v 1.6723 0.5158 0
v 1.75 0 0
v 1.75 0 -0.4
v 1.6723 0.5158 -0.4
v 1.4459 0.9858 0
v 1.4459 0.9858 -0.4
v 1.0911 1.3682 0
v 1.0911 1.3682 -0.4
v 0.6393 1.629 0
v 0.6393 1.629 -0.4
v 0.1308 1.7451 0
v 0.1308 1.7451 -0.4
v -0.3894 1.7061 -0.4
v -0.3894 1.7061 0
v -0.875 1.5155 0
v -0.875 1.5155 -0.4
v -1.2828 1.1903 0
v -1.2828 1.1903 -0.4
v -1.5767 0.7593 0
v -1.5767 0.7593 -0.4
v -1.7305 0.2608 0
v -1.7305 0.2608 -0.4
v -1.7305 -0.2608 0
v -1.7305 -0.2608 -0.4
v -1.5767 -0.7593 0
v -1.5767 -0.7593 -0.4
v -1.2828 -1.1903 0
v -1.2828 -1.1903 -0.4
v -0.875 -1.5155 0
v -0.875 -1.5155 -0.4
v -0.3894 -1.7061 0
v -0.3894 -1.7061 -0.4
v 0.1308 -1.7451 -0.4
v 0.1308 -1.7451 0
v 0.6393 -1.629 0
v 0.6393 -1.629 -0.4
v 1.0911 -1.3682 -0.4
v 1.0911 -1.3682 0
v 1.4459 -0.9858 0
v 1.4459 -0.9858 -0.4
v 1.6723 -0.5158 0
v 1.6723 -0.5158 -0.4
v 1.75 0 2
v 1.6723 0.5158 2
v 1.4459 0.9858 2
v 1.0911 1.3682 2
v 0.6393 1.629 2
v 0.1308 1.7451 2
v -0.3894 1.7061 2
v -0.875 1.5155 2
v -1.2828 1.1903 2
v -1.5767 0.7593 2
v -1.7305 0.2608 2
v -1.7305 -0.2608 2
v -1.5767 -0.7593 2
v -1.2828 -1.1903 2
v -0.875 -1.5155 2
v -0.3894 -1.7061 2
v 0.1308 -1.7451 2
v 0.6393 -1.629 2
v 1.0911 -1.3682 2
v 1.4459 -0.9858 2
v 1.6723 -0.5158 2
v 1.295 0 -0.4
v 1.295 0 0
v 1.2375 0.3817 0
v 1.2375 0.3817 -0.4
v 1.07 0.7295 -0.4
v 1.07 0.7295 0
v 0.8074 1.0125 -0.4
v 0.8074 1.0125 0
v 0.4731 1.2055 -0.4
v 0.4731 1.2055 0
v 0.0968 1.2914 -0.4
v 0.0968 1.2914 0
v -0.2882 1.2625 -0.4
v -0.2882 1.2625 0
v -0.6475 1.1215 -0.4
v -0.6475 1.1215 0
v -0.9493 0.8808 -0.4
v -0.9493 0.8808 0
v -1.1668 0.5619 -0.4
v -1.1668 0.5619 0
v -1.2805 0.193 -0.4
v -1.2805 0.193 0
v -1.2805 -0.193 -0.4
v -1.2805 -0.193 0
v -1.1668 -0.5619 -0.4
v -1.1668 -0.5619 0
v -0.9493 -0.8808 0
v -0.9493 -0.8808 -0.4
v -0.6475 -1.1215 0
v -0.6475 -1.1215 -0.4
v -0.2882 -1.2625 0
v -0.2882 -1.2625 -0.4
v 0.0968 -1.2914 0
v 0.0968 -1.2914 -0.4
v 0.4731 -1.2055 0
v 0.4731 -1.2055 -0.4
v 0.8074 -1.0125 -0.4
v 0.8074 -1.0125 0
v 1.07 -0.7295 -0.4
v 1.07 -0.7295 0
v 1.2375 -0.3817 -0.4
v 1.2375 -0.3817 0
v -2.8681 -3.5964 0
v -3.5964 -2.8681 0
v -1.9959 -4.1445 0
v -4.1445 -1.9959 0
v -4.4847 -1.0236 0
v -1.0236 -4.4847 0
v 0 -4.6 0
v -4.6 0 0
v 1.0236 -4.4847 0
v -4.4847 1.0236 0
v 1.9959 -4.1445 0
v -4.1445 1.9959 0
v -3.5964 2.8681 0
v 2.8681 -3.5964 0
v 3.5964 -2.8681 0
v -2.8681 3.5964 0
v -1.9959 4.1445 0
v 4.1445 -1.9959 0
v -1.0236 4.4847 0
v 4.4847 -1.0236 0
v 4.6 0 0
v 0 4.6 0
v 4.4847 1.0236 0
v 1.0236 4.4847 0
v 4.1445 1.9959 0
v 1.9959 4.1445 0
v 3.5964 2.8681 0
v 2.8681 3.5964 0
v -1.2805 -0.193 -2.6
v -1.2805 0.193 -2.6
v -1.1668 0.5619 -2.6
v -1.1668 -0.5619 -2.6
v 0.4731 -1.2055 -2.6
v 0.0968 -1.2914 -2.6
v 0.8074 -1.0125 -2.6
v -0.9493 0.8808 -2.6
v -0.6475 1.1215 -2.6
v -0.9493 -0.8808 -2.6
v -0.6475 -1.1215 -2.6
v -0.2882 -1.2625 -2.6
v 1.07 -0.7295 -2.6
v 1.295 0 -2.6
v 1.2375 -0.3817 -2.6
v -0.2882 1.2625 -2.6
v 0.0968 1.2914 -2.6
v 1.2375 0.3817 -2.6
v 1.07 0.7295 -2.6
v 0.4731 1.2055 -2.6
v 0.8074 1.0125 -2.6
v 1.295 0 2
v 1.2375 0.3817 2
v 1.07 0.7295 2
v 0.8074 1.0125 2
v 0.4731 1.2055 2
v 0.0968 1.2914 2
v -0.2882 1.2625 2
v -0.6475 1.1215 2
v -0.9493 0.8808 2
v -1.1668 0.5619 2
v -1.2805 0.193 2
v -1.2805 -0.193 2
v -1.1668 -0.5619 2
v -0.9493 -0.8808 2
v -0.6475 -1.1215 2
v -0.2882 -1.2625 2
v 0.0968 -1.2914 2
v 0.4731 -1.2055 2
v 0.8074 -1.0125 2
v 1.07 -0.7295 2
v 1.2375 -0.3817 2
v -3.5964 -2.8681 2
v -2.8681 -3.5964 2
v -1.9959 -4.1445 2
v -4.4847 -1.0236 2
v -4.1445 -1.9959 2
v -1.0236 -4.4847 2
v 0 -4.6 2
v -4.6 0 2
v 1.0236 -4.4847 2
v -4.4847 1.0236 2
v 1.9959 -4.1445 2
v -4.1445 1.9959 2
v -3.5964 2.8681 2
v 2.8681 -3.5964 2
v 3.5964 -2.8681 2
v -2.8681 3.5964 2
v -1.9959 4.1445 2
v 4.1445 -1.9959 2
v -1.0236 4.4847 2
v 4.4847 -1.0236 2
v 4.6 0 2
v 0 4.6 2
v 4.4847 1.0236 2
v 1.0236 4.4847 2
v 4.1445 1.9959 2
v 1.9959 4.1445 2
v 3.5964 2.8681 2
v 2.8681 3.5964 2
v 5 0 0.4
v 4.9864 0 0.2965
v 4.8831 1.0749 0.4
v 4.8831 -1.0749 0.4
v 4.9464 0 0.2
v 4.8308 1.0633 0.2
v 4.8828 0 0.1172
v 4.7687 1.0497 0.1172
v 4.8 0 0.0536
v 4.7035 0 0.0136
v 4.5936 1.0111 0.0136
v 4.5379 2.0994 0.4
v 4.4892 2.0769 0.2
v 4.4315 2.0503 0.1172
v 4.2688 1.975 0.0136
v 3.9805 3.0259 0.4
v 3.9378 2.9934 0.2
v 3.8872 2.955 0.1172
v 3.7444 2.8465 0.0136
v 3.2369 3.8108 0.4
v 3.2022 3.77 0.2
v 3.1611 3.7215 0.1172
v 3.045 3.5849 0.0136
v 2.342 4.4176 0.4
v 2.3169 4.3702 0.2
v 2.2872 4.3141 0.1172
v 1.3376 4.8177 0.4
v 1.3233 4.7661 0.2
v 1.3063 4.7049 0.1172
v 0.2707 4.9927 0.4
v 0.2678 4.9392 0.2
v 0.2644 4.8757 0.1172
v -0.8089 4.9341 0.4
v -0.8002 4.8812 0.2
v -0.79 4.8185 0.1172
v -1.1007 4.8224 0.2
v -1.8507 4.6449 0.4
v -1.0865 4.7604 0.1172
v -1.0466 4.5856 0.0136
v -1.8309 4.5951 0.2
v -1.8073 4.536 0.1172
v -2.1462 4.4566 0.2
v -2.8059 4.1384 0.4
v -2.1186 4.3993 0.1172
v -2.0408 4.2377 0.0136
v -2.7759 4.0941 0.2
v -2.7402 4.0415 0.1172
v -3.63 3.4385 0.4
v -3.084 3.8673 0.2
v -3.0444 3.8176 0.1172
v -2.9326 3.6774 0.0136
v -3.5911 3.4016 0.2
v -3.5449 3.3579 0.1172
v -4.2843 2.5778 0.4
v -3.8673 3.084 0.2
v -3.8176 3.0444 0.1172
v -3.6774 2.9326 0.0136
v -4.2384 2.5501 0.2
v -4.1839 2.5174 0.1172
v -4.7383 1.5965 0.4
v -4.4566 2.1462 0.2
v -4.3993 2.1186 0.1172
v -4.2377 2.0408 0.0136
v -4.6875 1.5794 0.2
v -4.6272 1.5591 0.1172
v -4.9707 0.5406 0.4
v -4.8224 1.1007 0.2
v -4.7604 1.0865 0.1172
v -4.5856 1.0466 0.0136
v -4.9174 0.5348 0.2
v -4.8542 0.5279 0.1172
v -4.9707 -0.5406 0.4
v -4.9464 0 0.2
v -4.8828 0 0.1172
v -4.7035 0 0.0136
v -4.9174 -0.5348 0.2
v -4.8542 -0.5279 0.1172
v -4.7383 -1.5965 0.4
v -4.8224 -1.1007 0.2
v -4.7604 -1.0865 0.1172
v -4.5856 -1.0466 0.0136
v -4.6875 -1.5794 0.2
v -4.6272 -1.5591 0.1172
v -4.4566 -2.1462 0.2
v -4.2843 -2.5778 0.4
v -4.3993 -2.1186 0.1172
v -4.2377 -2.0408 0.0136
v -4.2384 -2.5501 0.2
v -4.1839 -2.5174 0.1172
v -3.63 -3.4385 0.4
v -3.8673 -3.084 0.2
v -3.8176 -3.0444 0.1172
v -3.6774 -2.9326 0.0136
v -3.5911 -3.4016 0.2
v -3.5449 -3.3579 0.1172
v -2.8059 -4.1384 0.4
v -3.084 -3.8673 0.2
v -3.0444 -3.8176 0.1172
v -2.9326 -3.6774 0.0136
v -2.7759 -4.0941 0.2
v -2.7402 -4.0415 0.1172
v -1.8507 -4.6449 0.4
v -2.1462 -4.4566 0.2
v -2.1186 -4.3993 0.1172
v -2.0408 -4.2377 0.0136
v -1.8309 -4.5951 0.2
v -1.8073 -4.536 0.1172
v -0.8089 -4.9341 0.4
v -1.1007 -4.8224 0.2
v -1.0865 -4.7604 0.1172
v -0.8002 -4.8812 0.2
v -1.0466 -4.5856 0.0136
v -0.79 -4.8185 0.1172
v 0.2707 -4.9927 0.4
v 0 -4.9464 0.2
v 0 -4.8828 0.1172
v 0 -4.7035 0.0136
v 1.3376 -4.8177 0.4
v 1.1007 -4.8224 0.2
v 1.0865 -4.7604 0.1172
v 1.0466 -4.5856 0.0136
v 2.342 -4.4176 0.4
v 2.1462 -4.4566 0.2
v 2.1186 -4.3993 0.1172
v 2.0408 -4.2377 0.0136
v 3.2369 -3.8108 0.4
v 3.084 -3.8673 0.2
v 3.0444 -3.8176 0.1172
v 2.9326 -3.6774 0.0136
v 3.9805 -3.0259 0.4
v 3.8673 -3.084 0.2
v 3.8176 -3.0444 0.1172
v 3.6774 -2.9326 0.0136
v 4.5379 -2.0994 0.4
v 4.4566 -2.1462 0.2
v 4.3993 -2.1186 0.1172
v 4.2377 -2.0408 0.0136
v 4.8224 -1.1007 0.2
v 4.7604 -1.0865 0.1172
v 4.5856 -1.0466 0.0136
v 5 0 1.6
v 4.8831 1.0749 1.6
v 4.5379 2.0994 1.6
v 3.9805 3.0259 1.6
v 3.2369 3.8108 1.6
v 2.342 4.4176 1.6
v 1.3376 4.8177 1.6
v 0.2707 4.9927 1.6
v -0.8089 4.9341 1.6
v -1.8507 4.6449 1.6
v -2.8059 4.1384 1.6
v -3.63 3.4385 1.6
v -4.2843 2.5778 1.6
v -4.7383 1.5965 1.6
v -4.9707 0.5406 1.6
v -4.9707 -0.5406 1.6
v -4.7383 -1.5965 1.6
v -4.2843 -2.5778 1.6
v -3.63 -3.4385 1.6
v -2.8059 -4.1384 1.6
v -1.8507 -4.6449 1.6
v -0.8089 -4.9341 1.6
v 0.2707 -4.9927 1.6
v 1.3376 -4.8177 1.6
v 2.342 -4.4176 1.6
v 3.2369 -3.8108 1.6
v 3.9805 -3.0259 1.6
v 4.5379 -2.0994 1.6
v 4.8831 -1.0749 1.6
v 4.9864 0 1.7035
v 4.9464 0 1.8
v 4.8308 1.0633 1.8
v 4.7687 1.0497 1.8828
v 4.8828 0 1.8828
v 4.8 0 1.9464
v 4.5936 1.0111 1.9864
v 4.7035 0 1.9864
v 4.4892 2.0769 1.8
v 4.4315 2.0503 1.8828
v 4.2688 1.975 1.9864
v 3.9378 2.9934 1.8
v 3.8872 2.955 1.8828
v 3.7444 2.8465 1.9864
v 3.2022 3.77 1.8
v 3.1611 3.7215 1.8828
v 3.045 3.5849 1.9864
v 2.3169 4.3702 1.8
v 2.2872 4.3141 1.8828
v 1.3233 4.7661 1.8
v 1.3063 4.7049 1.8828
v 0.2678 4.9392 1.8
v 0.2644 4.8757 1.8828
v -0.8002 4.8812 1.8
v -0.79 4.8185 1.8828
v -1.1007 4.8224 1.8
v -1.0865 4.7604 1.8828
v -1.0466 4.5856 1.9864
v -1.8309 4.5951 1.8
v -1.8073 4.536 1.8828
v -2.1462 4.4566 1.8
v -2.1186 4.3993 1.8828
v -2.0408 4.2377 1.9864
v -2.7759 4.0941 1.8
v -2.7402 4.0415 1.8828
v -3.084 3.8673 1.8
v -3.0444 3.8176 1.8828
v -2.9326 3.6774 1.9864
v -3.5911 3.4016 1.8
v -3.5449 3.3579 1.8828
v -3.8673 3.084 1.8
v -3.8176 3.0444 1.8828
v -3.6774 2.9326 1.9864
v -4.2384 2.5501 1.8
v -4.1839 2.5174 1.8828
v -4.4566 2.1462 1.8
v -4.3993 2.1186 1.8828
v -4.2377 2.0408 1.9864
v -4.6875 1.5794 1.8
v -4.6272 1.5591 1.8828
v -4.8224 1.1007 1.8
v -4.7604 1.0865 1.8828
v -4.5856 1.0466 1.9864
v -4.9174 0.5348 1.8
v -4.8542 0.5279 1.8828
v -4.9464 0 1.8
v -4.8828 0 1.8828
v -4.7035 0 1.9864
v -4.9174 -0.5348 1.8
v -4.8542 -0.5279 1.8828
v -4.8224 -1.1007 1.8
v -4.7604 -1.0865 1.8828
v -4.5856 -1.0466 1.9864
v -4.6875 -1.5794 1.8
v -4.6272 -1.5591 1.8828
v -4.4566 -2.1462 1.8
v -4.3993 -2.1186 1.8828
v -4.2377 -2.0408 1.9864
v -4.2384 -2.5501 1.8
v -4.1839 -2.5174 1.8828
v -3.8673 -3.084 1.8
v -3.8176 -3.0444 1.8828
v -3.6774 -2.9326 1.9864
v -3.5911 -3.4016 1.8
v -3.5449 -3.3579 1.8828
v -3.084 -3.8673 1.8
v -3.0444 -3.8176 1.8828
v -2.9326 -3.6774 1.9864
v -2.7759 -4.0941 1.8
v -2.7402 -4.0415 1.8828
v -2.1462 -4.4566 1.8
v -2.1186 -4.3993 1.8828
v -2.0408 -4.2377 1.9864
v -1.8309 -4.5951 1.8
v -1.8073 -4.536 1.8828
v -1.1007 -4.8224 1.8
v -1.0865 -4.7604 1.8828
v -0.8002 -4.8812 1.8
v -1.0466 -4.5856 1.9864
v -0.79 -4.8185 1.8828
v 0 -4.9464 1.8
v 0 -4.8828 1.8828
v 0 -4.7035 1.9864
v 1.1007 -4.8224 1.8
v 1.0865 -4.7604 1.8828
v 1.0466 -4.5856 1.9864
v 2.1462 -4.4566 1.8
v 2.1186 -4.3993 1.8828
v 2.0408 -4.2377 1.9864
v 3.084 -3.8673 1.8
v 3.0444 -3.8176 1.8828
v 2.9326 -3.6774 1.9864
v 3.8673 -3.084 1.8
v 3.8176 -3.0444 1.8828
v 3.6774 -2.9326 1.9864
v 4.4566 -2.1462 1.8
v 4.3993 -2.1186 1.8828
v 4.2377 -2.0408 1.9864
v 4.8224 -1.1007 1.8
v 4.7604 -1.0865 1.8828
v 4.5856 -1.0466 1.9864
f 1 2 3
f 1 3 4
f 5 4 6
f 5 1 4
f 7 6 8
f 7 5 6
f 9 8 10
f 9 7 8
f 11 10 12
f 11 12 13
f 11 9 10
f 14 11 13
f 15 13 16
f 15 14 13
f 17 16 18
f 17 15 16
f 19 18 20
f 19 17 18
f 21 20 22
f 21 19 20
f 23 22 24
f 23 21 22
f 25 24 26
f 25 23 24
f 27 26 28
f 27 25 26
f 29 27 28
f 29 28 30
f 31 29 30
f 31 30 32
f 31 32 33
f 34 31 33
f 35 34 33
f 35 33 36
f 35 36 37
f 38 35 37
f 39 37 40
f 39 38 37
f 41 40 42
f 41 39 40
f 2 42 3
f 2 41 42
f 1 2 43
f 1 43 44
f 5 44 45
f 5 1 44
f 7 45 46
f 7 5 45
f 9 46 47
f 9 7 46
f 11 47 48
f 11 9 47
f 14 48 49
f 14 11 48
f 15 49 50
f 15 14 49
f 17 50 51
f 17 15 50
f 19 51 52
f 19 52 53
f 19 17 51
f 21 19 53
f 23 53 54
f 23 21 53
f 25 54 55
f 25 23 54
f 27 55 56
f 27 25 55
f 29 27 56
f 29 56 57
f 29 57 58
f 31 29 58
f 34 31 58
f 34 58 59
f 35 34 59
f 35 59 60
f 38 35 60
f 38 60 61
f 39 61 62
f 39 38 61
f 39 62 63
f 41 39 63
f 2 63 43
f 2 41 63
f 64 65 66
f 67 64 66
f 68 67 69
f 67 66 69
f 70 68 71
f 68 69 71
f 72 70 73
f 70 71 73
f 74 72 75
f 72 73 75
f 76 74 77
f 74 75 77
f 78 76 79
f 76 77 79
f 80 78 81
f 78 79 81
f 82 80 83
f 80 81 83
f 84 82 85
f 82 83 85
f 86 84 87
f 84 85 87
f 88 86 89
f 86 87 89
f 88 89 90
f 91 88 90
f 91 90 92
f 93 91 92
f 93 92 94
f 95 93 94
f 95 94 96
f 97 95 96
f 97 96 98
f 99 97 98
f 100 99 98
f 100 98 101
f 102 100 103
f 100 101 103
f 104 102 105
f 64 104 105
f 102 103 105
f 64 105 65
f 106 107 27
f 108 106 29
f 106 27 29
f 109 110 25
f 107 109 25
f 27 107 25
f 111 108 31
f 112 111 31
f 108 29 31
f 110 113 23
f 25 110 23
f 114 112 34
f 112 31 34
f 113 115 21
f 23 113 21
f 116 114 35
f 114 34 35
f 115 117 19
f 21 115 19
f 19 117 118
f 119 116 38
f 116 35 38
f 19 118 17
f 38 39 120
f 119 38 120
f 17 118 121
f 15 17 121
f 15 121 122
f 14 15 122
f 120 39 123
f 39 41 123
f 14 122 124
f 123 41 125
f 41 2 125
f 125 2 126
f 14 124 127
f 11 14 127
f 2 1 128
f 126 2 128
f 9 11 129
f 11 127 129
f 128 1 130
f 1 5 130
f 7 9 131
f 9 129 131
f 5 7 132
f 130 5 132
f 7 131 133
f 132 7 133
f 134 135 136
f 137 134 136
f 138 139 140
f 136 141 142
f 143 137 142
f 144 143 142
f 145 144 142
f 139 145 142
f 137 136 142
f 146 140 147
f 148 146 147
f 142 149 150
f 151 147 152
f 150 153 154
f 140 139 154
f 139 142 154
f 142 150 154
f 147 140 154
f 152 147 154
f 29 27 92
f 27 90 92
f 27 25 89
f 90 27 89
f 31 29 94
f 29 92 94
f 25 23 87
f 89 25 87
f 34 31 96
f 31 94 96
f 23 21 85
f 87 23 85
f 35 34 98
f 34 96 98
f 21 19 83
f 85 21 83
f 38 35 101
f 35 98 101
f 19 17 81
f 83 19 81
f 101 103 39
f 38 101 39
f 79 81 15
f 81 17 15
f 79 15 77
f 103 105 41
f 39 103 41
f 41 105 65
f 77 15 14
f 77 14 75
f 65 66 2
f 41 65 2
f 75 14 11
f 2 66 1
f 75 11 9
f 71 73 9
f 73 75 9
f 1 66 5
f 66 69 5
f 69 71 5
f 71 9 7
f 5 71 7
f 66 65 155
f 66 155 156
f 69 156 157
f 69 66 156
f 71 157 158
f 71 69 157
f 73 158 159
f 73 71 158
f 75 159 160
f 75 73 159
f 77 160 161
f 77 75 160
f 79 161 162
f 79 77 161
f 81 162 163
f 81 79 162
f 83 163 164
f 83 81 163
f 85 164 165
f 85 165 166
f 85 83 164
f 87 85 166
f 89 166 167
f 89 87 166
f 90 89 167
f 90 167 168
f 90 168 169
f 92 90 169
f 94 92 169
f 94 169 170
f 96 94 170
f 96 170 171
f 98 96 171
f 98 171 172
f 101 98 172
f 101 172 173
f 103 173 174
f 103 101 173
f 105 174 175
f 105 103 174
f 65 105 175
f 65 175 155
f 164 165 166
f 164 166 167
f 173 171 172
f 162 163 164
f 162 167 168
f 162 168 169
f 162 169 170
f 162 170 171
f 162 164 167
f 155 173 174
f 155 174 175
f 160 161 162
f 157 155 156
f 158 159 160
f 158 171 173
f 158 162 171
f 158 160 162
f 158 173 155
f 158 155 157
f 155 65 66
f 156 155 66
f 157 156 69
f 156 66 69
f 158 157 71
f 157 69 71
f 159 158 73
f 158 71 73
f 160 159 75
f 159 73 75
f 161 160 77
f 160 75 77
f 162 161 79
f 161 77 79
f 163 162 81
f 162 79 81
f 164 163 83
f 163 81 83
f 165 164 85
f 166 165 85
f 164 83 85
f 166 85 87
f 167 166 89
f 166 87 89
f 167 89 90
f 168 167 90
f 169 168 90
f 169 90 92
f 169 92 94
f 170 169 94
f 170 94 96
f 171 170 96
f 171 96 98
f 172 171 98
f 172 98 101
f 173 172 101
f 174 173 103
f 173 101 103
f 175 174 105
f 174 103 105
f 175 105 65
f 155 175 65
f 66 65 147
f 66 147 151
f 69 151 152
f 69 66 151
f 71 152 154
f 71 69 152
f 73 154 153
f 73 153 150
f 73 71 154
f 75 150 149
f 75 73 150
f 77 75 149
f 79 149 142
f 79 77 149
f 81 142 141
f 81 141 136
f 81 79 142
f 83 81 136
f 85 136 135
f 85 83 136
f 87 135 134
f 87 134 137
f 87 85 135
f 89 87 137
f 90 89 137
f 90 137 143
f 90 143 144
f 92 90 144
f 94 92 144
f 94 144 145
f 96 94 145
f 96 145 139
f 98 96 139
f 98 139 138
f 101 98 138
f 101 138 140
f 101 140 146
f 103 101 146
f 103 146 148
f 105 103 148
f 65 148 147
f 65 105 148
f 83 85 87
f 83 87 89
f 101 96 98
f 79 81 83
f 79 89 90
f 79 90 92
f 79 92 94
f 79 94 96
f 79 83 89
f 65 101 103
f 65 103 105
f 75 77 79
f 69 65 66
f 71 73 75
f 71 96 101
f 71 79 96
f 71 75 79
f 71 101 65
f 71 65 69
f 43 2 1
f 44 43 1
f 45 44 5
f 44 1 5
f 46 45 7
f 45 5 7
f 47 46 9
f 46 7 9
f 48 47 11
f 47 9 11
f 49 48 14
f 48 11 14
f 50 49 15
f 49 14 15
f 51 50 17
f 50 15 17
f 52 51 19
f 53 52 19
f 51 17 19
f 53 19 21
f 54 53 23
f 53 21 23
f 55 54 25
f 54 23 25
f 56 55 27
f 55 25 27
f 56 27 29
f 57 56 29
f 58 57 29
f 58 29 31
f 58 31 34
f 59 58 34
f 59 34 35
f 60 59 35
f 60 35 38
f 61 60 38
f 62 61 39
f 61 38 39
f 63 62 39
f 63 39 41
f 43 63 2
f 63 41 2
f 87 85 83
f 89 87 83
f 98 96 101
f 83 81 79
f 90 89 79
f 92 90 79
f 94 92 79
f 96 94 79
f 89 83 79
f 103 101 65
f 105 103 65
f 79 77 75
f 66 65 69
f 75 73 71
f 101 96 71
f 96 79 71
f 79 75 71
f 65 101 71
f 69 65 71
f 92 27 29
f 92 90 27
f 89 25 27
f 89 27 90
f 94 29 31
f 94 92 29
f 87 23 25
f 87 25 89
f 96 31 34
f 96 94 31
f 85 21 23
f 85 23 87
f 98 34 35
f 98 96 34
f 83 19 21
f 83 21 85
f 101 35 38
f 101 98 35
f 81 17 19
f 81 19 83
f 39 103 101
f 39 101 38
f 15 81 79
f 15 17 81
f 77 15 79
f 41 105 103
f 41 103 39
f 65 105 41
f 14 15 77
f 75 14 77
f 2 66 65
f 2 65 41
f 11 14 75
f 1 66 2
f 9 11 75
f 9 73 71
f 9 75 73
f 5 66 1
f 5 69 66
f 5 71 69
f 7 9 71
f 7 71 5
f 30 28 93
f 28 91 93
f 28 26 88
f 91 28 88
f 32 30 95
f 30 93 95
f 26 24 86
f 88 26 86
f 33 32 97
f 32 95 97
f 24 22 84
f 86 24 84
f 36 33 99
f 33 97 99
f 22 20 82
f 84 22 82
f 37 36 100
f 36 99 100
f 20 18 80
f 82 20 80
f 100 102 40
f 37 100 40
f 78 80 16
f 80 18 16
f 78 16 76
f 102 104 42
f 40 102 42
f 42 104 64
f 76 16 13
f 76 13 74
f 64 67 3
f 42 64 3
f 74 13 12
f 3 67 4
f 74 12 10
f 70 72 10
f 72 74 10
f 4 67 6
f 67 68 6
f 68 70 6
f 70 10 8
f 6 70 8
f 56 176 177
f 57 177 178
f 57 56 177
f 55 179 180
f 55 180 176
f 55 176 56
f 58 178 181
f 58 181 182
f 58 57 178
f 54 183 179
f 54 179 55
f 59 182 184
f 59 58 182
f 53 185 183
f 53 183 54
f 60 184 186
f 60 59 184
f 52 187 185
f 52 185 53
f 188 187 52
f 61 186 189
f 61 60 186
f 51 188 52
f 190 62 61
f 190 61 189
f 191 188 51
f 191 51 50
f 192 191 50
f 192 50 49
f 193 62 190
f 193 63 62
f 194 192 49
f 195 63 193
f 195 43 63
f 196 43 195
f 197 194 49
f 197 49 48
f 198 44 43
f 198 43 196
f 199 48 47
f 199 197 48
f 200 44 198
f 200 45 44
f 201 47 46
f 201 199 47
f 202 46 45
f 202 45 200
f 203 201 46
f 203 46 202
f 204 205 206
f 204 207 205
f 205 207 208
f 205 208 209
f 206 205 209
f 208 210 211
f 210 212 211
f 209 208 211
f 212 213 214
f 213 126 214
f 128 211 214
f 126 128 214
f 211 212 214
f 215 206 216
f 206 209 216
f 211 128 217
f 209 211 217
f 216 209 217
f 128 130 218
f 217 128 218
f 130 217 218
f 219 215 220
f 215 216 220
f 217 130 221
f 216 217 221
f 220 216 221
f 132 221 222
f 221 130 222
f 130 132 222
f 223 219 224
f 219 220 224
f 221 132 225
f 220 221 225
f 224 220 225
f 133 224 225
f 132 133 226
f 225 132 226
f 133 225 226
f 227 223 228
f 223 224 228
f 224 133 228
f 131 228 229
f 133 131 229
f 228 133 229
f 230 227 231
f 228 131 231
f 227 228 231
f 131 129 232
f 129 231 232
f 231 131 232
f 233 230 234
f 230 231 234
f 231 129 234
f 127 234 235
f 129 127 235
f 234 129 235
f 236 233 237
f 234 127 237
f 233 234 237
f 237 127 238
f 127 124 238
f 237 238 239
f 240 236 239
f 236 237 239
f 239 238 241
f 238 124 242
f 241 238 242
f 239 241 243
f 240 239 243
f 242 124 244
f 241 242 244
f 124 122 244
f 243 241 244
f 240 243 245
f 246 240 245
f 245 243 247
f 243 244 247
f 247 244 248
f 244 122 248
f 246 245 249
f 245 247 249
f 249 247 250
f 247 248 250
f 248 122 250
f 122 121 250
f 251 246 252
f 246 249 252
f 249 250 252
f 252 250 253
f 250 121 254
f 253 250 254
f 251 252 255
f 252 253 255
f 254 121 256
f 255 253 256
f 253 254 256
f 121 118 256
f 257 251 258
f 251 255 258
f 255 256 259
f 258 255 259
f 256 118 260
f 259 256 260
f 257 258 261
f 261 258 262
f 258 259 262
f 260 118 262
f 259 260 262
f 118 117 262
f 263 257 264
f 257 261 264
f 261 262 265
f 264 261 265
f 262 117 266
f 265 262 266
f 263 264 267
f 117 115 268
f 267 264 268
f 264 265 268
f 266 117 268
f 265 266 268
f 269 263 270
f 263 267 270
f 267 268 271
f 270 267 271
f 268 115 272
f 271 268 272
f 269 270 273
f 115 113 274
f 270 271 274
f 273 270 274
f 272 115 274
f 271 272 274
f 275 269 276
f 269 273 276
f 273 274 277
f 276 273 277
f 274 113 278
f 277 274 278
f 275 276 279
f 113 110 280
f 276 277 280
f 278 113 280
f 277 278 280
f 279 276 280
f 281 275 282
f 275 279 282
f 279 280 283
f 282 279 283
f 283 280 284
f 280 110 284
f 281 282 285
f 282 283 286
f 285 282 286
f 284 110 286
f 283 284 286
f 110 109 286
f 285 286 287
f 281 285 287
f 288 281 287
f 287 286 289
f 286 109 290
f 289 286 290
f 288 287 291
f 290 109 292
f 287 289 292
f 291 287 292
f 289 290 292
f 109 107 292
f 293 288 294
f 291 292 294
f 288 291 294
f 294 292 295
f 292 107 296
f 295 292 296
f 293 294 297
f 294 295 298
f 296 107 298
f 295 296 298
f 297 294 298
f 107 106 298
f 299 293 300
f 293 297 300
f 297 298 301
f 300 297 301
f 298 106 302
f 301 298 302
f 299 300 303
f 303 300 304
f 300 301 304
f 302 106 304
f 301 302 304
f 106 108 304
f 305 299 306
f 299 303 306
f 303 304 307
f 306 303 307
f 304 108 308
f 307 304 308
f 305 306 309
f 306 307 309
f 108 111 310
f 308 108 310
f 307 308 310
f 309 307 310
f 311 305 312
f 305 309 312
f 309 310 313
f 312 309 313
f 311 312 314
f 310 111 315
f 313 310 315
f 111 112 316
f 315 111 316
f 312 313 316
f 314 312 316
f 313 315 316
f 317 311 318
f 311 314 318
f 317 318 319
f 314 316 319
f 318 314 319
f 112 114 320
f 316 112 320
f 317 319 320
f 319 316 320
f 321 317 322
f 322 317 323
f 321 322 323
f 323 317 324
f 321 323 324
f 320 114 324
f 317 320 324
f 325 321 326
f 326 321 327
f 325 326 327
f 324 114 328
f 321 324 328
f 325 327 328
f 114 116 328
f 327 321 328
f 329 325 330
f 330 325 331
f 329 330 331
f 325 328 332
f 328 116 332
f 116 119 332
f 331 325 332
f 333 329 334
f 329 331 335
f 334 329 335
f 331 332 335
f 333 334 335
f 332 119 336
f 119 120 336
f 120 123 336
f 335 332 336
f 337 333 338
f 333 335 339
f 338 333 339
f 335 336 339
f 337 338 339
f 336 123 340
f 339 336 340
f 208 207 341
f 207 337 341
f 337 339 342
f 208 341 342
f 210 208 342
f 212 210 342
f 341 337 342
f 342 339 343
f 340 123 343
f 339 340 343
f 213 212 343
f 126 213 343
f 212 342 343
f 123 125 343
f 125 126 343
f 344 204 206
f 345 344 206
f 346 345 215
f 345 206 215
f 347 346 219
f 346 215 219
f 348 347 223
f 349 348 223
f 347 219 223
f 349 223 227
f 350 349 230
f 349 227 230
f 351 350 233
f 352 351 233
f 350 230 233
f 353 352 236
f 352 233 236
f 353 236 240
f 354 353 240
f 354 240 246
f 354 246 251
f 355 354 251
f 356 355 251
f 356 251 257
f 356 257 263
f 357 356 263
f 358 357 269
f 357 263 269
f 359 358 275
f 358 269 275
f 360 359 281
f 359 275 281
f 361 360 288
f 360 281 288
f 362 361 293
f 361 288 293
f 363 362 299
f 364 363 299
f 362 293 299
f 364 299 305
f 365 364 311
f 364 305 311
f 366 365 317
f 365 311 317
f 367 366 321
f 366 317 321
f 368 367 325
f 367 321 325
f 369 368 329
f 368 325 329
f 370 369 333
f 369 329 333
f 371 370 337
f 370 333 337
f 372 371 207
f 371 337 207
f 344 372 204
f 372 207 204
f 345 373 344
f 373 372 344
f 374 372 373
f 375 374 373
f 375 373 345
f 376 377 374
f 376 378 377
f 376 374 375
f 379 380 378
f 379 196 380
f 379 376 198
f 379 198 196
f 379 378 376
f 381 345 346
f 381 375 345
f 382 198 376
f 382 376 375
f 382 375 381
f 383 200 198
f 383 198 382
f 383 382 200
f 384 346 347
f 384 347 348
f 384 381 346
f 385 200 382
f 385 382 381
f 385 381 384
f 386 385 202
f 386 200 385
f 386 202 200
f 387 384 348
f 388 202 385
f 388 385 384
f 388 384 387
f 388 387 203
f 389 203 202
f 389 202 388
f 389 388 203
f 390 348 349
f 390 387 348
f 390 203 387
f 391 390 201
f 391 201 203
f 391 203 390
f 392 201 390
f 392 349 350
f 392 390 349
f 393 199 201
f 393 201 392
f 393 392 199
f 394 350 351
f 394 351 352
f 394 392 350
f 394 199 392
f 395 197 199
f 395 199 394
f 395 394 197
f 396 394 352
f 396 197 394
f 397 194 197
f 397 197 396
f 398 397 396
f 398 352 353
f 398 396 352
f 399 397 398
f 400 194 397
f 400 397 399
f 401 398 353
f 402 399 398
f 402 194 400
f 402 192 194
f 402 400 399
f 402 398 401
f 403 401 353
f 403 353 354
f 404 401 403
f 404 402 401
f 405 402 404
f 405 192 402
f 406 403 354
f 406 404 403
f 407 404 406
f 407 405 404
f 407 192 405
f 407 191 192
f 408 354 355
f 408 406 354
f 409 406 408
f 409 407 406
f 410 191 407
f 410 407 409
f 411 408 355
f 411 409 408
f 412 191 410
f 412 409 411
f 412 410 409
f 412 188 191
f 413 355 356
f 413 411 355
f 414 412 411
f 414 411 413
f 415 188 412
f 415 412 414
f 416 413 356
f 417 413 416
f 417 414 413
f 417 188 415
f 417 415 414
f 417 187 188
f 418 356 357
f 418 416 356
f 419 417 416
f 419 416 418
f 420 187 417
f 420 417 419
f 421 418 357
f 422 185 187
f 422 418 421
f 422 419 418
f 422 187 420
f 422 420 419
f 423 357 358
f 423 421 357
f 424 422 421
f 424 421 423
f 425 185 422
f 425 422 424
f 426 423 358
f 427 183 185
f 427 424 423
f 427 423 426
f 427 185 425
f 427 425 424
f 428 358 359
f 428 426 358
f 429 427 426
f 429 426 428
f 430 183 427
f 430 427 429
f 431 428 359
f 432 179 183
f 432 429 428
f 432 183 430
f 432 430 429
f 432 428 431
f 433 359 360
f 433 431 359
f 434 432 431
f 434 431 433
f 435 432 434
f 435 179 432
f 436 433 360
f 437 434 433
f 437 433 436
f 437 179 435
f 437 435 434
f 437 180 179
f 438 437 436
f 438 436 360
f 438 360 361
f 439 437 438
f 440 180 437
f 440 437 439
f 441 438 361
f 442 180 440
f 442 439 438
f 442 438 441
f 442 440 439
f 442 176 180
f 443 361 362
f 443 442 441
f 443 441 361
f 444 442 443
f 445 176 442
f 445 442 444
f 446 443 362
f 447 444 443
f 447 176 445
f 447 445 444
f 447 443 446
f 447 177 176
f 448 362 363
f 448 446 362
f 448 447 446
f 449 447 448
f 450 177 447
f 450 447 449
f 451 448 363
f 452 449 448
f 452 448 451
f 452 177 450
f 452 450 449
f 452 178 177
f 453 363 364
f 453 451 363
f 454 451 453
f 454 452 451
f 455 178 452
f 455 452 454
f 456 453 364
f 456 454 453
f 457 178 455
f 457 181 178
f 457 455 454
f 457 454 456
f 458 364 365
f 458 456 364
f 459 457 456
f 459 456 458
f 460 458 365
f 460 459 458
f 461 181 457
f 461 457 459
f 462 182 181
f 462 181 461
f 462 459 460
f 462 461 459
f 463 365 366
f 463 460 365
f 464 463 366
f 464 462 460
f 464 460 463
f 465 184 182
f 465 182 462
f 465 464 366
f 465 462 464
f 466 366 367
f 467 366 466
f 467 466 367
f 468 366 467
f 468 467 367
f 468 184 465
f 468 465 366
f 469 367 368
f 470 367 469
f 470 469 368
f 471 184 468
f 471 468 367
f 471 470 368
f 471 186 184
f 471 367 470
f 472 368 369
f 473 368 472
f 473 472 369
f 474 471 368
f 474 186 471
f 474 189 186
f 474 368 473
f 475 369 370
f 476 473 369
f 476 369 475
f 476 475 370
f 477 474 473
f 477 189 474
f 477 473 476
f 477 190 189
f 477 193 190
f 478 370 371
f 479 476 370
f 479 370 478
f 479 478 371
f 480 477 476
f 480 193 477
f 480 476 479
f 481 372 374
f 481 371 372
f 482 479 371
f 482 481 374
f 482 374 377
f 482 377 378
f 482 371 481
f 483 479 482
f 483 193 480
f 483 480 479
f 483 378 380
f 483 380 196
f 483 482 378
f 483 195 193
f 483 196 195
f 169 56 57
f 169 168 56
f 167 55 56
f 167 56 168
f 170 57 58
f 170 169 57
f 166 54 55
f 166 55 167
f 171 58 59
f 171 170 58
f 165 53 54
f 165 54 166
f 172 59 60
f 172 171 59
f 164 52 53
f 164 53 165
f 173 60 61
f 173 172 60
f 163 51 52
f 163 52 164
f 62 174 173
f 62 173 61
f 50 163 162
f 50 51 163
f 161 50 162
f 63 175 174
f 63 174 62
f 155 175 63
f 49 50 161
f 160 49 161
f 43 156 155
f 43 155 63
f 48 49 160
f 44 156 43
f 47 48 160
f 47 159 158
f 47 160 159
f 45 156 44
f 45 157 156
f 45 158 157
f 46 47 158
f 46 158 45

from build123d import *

# Parameters (mm, degrees)
F0_R     = 5
F0_R_2   = 1.75
F1_DEPTH = 2
F0_R_3   = 1.295
F3_DEPTH = 2
F4_DEPTH = 0.4
F5_DEPTH = 2
F6_R     = 0.4
F7_DEPTH = 2.6


# Not quite as in the source:
# - the program builds the solid bodies; features that only make, move or delete a surface that nothing else refers to are left out


with BuildPart() as f1:
    # F0 (on Top) → F1 (new body)
    with BuildSketch(Plane.XY):
        Circle(F0_R)
        Circle(F0_R_2, mode=Mode.SUBTRACT)
    extrude(amount=F1_DEPTH)

    # F6
    f6_edges = [f1.edges().sort_by_distance(p)[0] for p in [
        (-5, 0, 2),
        (-5, 0, 0),
    ]]
    fillet(f6_edges, radius=F6_R)


with BuildPart() as f3:
    # F0 (on Top) → F3 (new body)
    with BuildSketch(Plane.XY):
        Circle(F0_R_3)
    extrude(amount=F3_DEPTH)


with BuildPart() as f4:
    # F0 (on Top) → F4 (new body)
    with BuildSketch(Plane.XY):
        Circle(F0_R_2)
        Circle(F0_R_3, mode=Mode.SUBTRACT)
    extrude(amount=-F4_DEPTH)


with BuildPart() as f5:
    # F0 (on Top) → F5 (new body)
    with BuildSketch(Plane.XY):
        Circle(F0_R_2)
        Circle(F0_R_3, mode=Mode.SUBTRACT)
    extrude(amount=F5_DEPTH)


with BuildPart() as f7:
    # F7 (new): a face of the model
    f7_faces = [f3.part.faces().sort_by_distance(p)[0] for p in [
        (0, 0, 0),
    ]]
    extrude(f7_faces, amount=F7_DEPTH)


solid = Compound([f1.part, f3.part, f4.part, f5.part, f7.part])
